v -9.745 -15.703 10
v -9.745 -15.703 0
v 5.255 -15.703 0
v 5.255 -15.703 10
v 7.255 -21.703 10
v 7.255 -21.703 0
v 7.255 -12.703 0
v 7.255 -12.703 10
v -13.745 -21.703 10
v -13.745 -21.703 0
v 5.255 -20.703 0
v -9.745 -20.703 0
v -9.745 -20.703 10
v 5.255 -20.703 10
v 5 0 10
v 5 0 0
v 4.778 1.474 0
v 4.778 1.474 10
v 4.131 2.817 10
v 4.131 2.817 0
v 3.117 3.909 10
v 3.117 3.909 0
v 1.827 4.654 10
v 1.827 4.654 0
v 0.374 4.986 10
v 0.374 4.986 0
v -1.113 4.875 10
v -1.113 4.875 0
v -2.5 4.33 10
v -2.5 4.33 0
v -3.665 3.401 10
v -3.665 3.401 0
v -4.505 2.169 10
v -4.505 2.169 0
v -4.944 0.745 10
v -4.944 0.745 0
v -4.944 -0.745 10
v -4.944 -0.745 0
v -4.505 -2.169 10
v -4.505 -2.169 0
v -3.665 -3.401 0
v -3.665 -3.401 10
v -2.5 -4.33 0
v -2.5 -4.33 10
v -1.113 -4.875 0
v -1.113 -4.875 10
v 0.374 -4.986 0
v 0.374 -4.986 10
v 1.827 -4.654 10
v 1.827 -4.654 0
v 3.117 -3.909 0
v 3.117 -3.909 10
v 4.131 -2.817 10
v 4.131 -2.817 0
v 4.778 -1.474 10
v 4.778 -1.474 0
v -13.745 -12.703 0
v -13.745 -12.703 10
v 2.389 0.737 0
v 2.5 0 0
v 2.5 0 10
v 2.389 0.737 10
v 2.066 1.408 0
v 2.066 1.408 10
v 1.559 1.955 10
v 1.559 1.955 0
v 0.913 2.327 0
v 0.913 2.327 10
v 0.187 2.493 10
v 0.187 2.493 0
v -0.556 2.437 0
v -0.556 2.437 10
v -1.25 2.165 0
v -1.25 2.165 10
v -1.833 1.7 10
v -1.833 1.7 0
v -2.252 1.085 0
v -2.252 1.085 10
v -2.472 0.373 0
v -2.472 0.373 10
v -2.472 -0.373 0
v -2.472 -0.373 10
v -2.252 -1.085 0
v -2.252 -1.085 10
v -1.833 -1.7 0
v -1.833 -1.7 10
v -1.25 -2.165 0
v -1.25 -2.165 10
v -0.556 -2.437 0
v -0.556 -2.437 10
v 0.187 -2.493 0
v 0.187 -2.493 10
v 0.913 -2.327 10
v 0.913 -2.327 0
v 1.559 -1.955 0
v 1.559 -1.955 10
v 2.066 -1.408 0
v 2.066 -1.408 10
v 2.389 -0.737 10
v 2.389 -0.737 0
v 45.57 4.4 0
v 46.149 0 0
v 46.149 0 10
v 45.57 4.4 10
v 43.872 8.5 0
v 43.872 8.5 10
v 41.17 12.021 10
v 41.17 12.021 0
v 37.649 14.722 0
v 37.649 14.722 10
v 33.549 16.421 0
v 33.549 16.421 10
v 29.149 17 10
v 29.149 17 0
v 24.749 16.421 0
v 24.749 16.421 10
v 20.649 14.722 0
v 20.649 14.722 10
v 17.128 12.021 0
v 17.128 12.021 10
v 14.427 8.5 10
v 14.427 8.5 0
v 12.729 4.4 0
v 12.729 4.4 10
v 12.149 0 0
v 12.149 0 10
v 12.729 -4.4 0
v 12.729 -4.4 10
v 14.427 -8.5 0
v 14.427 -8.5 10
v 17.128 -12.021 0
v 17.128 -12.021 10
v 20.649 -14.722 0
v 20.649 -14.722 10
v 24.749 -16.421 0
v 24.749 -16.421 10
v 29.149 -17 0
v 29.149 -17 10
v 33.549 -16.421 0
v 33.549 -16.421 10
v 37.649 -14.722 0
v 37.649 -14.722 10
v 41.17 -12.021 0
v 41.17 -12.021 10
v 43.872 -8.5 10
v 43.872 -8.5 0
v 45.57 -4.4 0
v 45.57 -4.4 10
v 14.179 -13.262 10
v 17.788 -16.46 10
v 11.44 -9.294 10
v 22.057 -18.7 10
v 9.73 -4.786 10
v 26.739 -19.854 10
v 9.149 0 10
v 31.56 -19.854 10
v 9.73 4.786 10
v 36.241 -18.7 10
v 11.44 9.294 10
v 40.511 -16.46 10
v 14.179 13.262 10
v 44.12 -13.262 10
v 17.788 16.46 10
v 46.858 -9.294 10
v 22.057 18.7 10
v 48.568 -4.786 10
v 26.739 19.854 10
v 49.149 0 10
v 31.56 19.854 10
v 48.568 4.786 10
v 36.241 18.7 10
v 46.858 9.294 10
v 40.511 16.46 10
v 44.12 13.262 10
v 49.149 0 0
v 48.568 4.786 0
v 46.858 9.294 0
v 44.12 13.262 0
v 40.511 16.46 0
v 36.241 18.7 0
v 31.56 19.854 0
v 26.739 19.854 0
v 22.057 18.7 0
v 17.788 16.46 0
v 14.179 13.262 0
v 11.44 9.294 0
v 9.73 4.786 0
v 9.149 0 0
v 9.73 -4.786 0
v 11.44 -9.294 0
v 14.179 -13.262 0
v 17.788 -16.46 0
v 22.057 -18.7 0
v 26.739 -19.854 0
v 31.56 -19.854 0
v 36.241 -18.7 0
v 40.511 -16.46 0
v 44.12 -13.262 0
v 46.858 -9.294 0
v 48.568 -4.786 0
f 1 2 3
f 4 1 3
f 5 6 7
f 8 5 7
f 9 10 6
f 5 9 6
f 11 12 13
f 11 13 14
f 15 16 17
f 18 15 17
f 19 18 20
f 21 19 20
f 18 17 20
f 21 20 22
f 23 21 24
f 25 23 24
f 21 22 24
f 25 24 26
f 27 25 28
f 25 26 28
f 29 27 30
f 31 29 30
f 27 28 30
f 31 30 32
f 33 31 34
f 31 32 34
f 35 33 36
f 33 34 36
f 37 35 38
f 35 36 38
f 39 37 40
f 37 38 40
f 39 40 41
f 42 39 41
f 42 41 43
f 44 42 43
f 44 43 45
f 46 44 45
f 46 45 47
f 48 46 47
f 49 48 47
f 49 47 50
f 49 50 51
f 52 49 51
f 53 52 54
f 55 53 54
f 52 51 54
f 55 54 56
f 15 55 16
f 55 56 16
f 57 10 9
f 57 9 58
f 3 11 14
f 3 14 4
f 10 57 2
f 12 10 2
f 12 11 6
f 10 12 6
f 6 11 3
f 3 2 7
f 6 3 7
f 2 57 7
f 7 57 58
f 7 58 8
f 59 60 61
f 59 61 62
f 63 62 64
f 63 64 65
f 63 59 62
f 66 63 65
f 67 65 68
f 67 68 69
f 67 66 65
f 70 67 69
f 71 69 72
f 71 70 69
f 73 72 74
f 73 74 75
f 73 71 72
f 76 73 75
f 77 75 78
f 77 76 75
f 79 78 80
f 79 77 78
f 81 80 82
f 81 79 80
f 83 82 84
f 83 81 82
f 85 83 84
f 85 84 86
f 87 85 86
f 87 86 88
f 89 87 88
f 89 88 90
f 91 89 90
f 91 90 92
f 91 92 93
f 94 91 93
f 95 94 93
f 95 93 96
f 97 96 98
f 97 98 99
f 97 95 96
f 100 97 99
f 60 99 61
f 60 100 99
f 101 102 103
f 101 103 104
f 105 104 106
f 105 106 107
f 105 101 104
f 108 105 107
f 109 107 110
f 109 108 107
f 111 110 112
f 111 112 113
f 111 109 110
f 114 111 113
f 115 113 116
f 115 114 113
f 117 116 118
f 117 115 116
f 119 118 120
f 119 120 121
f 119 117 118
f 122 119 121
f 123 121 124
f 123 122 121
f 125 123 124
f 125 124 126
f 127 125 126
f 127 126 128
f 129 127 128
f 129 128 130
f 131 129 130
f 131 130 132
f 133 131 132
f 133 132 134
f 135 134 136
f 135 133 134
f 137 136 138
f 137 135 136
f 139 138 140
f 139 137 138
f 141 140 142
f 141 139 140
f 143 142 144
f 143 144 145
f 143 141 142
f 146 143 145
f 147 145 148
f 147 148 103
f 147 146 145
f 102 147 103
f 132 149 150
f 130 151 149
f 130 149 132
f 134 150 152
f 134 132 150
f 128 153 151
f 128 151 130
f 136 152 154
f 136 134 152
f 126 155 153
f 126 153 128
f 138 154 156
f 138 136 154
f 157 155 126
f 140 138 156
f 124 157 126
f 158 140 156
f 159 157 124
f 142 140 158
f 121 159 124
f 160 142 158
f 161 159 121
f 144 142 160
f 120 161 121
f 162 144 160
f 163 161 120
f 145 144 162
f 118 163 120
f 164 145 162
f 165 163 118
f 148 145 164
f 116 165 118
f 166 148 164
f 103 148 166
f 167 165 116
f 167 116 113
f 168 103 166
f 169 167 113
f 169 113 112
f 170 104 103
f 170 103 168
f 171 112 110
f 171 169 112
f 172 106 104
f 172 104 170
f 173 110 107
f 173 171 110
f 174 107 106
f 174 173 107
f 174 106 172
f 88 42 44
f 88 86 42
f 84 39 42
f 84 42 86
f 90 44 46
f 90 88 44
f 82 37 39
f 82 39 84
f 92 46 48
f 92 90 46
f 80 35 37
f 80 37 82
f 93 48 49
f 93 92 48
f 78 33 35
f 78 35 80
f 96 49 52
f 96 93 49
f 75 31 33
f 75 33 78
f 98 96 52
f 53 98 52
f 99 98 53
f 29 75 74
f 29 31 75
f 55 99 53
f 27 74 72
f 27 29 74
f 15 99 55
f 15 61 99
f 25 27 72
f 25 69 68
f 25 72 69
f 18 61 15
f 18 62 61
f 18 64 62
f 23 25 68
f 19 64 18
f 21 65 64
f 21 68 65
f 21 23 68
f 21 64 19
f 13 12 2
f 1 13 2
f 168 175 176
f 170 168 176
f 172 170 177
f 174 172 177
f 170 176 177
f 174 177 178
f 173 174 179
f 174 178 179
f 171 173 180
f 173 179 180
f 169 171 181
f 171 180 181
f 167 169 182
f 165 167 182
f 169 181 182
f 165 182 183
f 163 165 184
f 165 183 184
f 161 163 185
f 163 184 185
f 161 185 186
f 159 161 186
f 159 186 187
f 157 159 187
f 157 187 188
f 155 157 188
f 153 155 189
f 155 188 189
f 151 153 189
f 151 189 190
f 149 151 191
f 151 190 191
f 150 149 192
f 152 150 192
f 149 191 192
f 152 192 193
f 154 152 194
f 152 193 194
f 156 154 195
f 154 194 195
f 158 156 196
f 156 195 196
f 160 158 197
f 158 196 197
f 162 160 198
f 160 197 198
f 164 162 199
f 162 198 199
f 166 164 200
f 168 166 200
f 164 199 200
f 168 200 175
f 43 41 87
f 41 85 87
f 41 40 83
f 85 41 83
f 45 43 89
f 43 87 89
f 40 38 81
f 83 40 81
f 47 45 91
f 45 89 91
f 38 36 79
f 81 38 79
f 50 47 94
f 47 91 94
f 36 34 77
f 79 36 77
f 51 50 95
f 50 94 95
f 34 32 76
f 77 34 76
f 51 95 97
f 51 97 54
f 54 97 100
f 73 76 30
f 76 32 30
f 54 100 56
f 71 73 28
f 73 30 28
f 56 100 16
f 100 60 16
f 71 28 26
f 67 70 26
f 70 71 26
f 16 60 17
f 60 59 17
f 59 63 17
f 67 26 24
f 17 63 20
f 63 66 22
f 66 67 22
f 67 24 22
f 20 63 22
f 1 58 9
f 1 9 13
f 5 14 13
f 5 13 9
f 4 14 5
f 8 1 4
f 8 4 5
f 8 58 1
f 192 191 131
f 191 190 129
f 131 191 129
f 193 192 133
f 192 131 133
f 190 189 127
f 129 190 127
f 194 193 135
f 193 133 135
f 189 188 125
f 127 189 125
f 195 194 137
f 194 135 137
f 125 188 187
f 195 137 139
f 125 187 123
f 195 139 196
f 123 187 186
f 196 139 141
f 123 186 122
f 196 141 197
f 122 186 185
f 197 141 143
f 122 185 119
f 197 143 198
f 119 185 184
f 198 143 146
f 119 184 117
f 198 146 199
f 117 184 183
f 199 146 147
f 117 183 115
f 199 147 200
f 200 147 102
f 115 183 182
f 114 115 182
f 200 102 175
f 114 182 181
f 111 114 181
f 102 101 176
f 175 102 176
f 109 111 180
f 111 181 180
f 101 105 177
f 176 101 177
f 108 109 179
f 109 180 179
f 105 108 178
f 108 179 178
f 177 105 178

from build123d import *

# Parameters (mm, degrees)
F0_R     = 20
F0_R_2   = 17
F0_R_3   = 5
F0_R_4   = 2.5
F1_DEPTH = 10
F2_W     = 21
F2_H     = 9
F2_W_2   = 15
F2_H_2   = 5
F3_DEPTH = 10


with BuildPart() as f1:
    # F0 (on Top) → F1 (new body)
    with BuildSketch(Plane.XY):
        with Locations((29.149298, 0)):
            Circle(F0_R)
        with Locations((29.149298, 0)):
            Circle(F0_R_2, mode=Mode.SUBTRACT)
        Circle(F0_R_3)
        Circle(F0_R_4, mode=Mode.SUBTRACT)
    extrude(amount=F1_DEPTH)


with BuildPart() as f3:
    # F2 (on Top) → F3 (new body)
    with BuildSketch(Plane.XY):
        with Locations((-3.245429, -17.203346)):
            Rectangle(F2_W, F2_H)
        with Locations((-2.245429, -18.203346)):
            Rectangle(F2_W_2, F2_H_2, mode=Mode.SUBTRACT)
    extrude(amount=F3_DEPTH)


solid = Compound([f1.part, f3.part])
